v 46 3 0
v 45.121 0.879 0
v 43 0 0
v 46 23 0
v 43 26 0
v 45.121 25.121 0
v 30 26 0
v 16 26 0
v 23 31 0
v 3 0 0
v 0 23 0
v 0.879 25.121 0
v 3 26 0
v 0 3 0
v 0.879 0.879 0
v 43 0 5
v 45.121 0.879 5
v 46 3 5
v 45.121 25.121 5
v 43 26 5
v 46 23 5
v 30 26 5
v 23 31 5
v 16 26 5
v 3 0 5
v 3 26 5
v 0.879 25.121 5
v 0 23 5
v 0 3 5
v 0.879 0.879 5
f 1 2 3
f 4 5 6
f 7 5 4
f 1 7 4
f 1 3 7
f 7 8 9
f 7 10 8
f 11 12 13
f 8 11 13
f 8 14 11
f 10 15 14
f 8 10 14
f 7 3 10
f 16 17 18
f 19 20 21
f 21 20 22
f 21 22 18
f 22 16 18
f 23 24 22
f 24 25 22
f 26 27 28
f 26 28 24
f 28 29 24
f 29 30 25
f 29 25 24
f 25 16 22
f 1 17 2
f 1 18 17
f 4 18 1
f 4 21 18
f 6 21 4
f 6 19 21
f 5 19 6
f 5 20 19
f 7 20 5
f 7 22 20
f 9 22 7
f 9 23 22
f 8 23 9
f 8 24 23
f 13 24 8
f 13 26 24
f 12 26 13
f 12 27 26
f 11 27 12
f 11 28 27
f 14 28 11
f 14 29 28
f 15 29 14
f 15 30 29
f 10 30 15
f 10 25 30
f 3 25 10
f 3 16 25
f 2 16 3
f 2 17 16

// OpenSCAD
$fn = 32;

// ----------------------------------------------------------------------
// Ratchet pawl: 46 x 26 mm body, beak 5 mm сверху
// ----------------------------------------------------------------------

// --- parameters (mm) ---
profile_height = 5;       // extrusion height
profile_points = 15;      // points of the closed outline

profile = [[0, 3], [0.879, 0.879], [3, 0], [43, 0], [45.121, 0.879], [46, 3], [46, 23], [45.121, 25.121], [43, 26], [30, 26], [23, 31], [16, 26], [3, 26], [0.879, 25.121], [0, 23]];  // single closed polygon, 15 points, counter clockwise

// --- the one profile operation ---
linear_extrude(height = profile_height) polygon(points = profile);
